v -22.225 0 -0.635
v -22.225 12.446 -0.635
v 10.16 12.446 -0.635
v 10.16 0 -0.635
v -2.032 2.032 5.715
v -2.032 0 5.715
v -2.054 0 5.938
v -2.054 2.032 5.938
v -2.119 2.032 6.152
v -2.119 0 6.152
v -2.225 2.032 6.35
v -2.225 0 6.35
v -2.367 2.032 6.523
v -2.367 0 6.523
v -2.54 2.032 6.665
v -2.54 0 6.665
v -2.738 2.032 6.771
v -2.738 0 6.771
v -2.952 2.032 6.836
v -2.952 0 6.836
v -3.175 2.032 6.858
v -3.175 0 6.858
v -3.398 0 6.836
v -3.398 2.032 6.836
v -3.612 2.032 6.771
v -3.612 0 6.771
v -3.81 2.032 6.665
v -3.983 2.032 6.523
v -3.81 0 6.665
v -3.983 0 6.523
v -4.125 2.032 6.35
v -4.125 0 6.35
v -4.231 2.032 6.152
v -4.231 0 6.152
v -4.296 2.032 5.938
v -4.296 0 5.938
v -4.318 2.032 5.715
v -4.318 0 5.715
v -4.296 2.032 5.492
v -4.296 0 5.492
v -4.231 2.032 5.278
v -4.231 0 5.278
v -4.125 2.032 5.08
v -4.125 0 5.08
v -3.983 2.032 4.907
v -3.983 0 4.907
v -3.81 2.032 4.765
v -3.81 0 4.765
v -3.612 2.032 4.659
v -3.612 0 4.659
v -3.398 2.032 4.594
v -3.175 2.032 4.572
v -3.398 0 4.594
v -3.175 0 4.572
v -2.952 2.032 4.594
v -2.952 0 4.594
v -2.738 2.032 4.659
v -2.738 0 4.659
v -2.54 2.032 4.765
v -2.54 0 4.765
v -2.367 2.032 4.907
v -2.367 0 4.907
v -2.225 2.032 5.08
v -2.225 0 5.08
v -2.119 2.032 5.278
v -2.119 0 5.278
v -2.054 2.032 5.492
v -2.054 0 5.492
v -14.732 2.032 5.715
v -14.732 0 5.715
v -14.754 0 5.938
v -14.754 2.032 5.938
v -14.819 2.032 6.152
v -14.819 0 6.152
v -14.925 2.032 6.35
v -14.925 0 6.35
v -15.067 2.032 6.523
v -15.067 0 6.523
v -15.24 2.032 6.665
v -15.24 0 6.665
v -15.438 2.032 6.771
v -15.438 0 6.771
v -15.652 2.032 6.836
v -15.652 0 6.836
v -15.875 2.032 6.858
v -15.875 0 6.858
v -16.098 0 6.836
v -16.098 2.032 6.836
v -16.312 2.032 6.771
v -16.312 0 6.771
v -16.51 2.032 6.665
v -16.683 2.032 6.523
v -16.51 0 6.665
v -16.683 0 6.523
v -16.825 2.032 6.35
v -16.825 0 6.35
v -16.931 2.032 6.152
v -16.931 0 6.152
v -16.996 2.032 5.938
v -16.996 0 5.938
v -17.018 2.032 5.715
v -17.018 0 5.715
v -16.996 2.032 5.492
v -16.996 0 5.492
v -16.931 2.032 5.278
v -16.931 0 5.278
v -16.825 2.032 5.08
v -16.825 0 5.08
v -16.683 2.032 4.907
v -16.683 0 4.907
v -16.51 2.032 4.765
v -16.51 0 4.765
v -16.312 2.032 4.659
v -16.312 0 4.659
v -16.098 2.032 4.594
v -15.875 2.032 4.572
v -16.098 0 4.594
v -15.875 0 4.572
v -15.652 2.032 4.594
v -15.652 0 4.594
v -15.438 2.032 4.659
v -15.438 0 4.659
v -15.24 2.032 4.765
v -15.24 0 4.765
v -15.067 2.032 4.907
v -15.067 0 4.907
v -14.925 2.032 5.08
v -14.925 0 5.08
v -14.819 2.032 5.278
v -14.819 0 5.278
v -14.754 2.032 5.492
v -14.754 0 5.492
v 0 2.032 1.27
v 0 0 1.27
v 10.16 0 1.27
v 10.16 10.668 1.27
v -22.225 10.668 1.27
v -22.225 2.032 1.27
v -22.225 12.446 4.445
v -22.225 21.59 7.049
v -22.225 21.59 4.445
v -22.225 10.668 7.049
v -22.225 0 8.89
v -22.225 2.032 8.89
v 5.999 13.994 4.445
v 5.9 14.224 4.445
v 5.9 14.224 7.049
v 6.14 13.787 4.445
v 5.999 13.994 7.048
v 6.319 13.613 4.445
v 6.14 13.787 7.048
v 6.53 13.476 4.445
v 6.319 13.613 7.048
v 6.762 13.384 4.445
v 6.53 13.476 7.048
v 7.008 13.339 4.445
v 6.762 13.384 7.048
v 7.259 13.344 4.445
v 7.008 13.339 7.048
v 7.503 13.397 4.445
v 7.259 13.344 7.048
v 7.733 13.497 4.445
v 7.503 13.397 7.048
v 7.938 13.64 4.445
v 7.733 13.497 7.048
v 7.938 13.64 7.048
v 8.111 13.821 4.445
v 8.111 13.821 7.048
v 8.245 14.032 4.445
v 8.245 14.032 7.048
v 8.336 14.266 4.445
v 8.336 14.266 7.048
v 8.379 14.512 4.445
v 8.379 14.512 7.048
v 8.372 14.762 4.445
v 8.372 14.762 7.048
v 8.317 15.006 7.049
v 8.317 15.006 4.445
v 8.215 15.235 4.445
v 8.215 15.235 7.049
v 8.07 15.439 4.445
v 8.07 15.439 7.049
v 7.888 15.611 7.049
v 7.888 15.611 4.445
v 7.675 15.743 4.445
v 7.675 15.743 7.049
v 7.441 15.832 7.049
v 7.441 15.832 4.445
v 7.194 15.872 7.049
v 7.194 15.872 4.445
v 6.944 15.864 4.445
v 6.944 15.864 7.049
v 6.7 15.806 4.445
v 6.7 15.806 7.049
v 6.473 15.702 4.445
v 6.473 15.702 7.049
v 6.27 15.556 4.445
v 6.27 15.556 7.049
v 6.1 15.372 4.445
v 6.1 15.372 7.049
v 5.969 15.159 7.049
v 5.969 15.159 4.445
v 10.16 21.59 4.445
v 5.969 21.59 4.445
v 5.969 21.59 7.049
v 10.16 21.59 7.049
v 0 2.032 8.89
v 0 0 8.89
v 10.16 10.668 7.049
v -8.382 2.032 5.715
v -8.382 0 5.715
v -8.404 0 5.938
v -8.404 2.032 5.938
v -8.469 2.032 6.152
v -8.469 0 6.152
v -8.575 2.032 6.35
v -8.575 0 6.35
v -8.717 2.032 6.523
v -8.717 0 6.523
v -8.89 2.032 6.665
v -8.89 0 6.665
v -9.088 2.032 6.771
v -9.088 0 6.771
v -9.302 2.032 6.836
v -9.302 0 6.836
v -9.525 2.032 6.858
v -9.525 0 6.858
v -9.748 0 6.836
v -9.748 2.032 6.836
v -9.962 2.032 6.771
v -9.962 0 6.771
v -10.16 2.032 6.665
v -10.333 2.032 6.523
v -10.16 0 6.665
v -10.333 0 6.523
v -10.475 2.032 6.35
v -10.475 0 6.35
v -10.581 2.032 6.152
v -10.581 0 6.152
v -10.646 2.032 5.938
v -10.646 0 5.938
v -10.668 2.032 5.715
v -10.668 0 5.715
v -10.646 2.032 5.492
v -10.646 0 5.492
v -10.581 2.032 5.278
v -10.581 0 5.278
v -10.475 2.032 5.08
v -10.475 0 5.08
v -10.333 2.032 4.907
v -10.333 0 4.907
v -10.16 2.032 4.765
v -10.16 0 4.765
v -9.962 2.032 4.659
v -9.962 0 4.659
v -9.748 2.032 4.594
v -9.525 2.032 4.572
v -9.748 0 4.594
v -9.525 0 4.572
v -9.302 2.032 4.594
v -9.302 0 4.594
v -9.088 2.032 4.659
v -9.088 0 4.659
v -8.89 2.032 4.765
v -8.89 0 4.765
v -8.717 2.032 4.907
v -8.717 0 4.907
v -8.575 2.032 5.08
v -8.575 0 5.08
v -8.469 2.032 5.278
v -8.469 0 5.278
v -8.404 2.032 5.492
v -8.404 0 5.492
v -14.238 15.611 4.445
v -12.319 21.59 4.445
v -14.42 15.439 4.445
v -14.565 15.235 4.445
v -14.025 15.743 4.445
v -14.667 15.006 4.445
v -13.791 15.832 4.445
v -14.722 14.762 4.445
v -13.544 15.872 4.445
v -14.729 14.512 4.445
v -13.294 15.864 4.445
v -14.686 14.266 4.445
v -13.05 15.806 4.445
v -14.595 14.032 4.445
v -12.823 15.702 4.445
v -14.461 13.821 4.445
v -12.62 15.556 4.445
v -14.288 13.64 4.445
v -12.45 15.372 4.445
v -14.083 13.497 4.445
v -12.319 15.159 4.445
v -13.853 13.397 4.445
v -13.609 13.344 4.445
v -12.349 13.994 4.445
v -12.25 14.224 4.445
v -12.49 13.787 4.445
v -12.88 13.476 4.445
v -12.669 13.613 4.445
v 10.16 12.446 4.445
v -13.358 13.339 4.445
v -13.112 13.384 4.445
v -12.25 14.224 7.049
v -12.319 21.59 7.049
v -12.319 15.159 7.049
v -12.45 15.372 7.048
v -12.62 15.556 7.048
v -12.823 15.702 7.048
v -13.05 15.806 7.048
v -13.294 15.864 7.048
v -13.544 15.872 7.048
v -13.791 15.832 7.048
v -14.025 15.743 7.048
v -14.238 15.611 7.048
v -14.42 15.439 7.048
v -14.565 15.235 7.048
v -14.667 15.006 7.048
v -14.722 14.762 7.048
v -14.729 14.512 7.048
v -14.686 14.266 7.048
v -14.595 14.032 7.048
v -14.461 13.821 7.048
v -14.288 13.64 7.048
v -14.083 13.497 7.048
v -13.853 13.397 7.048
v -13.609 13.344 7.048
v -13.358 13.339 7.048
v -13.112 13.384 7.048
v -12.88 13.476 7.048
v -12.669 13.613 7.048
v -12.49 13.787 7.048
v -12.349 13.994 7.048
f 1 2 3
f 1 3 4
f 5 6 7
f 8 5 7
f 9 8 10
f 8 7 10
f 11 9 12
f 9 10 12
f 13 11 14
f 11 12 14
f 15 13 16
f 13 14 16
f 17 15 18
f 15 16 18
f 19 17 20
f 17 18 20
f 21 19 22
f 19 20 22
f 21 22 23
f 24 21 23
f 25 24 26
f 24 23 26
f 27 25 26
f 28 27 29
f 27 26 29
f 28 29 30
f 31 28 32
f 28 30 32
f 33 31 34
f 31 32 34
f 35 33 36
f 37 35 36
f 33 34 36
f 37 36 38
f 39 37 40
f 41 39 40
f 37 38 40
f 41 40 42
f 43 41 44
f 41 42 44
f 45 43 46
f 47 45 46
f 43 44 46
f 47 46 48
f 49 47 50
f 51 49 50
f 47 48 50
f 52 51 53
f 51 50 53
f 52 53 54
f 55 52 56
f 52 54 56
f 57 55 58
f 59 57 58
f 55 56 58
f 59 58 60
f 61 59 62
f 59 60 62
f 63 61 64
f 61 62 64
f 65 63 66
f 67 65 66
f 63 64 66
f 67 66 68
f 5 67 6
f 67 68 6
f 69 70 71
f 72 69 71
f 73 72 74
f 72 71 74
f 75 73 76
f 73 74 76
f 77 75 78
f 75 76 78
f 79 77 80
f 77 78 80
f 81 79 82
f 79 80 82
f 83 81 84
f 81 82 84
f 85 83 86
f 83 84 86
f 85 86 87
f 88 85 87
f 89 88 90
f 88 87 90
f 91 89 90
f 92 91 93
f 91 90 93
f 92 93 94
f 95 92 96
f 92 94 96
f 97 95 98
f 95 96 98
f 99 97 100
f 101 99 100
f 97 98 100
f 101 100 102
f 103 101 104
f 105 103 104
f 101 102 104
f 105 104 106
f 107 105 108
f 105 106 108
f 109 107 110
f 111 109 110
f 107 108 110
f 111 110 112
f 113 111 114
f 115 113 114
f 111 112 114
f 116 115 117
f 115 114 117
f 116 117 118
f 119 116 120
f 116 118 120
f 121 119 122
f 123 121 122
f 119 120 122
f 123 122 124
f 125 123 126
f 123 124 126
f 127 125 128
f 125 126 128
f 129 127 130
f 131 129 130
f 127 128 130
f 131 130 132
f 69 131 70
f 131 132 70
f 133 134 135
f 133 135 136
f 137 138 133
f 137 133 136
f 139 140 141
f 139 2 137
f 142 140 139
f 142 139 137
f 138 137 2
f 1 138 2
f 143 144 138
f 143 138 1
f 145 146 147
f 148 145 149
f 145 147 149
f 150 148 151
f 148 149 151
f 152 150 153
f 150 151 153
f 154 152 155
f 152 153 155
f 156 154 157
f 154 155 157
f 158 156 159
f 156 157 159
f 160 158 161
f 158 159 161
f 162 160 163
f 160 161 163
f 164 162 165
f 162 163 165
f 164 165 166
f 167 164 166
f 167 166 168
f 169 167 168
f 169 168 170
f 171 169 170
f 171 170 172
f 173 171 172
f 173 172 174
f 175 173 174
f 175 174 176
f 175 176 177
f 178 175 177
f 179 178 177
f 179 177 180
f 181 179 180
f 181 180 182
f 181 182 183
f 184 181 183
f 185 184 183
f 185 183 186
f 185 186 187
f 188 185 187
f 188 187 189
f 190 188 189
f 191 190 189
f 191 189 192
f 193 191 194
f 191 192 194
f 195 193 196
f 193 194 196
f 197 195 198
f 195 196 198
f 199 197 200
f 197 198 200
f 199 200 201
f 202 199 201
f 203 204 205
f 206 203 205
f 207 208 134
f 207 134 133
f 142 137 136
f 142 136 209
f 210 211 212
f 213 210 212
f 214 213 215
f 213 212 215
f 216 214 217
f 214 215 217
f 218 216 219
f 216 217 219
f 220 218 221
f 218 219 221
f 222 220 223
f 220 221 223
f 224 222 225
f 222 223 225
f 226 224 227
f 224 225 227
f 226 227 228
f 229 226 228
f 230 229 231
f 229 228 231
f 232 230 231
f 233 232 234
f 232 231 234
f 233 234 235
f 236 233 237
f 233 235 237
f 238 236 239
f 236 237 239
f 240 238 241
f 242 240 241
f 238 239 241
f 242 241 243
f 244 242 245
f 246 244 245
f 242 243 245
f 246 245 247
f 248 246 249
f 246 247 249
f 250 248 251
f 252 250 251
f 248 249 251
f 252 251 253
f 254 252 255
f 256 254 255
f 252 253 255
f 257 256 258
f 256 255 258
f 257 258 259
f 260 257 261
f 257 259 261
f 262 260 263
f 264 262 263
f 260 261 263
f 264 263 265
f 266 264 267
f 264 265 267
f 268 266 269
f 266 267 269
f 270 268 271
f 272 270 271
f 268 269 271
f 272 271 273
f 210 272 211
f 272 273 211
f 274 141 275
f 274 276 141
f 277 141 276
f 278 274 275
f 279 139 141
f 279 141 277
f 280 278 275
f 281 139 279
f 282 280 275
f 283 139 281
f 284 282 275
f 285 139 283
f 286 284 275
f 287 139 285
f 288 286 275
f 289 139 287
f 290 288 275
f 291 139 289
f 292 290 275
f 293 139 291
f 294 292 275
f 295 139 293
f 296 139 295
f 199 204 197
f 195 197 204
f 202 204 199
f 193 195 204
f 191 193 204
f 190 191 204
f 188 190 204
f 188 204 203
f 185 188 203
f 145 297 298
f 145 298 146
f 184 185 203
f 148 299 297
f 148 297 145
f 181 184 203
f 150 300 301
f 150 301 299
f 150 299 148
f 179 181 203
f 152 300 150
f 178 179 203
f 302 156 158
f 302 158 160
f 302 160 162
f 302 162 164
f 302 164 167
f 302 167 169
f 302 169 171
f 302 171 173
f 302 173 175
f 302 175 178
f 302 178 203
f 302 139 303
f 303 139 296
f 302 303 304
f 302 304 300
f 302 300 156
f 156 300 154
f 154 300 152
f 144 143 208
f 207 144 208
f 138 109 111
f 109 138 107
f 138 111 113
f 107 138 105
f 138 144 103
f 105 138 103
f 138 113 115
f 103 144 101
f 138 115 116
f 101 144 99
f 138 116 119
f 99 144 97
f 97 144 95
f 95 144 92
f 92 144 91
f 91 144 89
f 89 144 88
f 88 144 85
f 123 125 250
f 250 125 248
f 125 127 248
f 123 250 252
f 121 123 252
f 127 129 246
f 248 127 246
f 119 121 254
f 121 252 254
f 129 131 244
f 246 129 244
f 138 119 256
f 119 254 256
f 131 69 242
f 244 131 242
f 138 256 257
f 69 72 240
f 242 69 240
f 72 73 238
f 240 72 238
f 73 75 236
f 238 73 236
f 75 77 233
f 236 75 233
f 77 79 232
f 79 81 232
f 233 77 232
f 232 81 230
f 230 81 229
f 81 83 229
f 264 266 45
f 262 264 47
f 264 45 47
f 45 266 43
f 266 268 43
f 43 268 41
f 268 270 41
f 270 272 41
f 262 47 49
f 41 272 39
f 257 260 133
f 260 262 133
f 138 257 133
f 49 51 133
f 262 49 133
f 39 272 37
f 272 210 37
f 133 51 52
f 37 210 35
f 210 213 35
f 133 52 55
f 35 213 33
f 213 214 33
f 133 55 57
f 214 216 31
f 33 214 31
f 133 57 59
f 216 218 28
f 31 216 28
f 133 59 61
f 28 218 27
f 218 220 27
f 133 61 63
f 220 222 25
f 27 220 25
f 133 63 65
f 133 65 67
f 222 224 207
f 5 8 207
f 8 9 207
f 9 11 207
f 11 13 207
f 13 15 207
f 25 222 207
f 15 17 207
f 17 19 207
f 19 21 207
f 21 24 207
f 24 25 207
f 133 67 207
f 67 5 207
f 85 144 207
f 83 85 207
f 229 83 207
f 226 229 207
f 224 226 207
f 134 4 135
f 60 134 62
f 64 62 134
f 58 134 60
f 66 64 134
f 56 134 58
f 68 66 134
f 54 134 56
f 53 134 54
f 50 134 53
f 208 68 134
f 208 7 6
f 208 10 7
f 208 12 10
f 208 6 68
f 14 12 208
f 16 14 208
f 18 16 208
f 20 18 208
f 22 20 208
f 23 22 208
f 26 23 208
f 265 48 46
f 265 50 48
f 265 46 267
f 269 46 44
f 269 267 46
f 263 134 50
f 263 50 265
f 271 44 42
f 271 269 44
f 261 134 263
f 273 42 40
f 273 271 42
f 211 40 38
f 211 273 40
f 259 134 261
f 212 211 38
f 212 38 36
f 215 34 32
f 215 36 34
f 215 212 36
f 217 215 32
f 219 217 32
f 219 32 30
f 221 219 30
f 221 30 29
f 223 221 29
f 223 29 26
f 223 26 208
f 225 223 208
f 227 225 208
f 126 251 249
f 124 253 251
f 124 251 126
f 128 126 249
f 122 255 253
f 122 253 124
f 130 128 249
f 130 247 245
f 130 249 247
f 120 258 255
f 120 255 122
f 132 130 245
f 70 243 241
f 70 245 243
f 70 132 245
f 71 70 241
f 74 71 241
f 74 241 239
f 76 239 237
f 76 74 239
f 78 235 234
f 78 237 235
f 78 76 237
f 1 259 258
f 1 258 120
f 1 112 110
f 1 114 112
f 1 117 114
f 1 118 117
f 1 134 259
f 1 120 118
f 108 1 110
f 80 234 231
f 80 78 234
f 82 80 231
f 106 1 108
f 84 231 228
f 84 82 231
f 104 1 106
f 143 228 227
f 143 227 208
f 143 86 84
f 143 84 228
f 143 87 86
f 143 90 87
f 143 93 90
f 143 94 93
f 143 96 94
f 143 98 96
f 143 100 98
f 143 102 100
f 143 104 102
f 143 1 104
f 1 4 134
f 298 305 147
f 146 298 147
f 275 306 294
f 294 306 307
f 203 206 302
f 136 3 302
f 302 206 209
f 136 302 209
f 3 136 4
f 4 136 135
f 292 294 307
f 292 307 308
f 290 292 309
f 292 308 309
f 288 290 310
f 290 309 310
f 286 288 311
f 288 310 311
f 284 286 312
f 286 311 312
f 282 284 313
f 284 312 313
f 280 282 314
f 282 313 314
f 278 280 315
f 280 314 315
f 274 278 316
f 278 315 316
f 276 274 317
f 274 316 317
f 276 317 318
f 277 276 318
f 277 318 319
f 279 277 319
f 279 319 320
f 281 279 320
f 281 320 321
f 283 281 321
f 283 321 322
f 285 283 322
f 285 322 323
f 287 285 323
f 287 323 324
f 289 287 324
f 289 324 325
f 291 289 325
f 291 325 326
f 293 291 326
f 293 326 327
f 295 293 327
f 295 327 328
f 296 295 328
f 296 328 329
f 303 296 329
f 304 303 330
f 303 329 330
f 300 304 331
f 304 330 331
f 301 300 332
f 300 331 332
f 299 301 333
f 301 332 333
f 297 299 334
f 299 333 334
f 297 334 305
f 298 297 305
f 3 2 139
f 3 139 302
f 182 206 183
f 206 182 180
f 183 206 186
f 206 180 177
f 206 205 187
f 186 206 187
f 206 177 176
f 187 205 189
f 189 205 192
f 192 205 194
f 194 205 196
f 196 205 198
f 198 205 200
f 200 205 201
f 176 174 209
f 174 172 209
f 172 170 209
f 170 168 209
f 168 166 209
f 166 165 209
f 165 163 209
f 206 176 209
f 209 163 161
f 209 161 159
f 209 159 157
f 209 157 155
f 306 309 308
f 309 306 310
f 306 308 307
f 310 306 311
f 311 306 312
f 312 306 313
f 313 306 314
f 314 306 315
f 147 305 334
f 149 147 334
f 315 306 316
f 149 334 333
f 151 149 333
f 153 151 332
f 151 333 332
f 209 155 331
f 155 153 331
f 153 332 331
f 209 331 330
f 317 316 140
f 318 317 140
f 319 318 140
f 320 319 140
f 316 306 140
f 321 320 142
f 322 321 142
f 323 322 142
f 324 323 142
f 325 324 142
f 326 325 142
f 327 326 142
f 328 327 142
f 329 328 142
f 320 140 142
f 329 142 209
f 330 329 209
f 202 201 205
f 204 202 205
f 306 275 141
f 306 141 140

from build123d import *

# Parameters (mm, degrees)
F0_W      = 22.225
F0_H      = 8.89
F0_R      = 1.143
F1_DEPTH  = 2.032
F2_W      = 17.78
F2_H      = 1.905
F3_DEPTH  = 22.225
F4_DEPTH  = 10.16
F5_W      = 10.922
F5_H      = 7.6835
F7_DEPTH  = 32.385
F6_W      = 18.288
F6_H      = 3.556
F6_H_2    = 6.604
F8_DEPTH  = 12.7
F9_R      = 1.27
F10_DEPTH = 25.4
F11_W     = 32.385
F11_H     = 9.652
F12_DEPTH = 5.08


with BuildPart() as f1:
    # F0 (on Front) → F1 (new body)
    with BuildSketch(Plane.XZ):
        with Locations((-11.1125, 4.445)):
            Rectangle(F0_W, F0_H)
        with Locations((-15.875, 5.715)):
            Circle(F0_R, mode=Mode.SUBTRACT)
        with Locations((-9.525, 5.715)):
            Circle(F0_R, mode=Mode.SUBTRACT)
        with Locations((-3.175, 5.715)):
            Circle(F0_R, mode=Mode.SUBTRACT)
    extrude(amount=-F1_DEPTH)

    # F2 (on Right) → F3 (join, through all)
    with BuildSketch(Plane.YZ):
        with Locations((8.89, 0.3175)):
            Rectangle(F2_W, F2_H)
    extrude(amount=-F3_DEPTH)

    # F2 (on Right) → F4 (join)
    with BuildSketch(Plane.YZ):
        with Locations((8.89, 0.3175)):
            Rectangle(F2_W, F2_H)
    extrude(amount=F4_DEPTH)

    # F5 (on face) → F7 (join, through all)
    with BuildSketch(Plane(origin=(-22.225, 0, 0), x_dir=(0, -1, 0), z_dir=(-1, 0, 0))):
        with Locations((-16.129, 3.20675)):
            Rectangle(F5_W, F5_H)
    extrude(amount=-F7_DEPTH)

    # F6 (on face) → F8 (cut, symmetric)
    with BuildSketch(Plane.XY.offset(1.27)):
        with Locations((-3.175, 16.002)):
            Rectangle(F6_W, F6_H)
        with Locations((-3.175, 21.082)):
            Rectangle(F6_W, F6_H_2)
    extrude(amount=F8_DEPTH, both=True, mode=Mode.SUBTRACT)

    # F9 (on face) → F10 (cut)
    with BuildSketch(Plane.XY.offset(7.0485)):
        with Locations((-13.462, 14.605)):
            Circle(F9_R)
        with Locations((7.112, 14.605)):
            Circle(F9_R)
    extrude(amount=-F10_DEPTH, mode=Mode.SUBTRACT)

    # F11 (on face) → F12 (cut)
    with BuildSketch(Plane(origin=(0, 0, -0.635), x_dir=(1, 0, 0), z_dir=(0, 0, -1))):
        with Locations((-6.0325, -17.272)):
            Rectangle(F11_W, F11_H)
    extrude(amount=-F12_DEPTH, mode=Mode.SUBTRACT)


solid = f1.part
